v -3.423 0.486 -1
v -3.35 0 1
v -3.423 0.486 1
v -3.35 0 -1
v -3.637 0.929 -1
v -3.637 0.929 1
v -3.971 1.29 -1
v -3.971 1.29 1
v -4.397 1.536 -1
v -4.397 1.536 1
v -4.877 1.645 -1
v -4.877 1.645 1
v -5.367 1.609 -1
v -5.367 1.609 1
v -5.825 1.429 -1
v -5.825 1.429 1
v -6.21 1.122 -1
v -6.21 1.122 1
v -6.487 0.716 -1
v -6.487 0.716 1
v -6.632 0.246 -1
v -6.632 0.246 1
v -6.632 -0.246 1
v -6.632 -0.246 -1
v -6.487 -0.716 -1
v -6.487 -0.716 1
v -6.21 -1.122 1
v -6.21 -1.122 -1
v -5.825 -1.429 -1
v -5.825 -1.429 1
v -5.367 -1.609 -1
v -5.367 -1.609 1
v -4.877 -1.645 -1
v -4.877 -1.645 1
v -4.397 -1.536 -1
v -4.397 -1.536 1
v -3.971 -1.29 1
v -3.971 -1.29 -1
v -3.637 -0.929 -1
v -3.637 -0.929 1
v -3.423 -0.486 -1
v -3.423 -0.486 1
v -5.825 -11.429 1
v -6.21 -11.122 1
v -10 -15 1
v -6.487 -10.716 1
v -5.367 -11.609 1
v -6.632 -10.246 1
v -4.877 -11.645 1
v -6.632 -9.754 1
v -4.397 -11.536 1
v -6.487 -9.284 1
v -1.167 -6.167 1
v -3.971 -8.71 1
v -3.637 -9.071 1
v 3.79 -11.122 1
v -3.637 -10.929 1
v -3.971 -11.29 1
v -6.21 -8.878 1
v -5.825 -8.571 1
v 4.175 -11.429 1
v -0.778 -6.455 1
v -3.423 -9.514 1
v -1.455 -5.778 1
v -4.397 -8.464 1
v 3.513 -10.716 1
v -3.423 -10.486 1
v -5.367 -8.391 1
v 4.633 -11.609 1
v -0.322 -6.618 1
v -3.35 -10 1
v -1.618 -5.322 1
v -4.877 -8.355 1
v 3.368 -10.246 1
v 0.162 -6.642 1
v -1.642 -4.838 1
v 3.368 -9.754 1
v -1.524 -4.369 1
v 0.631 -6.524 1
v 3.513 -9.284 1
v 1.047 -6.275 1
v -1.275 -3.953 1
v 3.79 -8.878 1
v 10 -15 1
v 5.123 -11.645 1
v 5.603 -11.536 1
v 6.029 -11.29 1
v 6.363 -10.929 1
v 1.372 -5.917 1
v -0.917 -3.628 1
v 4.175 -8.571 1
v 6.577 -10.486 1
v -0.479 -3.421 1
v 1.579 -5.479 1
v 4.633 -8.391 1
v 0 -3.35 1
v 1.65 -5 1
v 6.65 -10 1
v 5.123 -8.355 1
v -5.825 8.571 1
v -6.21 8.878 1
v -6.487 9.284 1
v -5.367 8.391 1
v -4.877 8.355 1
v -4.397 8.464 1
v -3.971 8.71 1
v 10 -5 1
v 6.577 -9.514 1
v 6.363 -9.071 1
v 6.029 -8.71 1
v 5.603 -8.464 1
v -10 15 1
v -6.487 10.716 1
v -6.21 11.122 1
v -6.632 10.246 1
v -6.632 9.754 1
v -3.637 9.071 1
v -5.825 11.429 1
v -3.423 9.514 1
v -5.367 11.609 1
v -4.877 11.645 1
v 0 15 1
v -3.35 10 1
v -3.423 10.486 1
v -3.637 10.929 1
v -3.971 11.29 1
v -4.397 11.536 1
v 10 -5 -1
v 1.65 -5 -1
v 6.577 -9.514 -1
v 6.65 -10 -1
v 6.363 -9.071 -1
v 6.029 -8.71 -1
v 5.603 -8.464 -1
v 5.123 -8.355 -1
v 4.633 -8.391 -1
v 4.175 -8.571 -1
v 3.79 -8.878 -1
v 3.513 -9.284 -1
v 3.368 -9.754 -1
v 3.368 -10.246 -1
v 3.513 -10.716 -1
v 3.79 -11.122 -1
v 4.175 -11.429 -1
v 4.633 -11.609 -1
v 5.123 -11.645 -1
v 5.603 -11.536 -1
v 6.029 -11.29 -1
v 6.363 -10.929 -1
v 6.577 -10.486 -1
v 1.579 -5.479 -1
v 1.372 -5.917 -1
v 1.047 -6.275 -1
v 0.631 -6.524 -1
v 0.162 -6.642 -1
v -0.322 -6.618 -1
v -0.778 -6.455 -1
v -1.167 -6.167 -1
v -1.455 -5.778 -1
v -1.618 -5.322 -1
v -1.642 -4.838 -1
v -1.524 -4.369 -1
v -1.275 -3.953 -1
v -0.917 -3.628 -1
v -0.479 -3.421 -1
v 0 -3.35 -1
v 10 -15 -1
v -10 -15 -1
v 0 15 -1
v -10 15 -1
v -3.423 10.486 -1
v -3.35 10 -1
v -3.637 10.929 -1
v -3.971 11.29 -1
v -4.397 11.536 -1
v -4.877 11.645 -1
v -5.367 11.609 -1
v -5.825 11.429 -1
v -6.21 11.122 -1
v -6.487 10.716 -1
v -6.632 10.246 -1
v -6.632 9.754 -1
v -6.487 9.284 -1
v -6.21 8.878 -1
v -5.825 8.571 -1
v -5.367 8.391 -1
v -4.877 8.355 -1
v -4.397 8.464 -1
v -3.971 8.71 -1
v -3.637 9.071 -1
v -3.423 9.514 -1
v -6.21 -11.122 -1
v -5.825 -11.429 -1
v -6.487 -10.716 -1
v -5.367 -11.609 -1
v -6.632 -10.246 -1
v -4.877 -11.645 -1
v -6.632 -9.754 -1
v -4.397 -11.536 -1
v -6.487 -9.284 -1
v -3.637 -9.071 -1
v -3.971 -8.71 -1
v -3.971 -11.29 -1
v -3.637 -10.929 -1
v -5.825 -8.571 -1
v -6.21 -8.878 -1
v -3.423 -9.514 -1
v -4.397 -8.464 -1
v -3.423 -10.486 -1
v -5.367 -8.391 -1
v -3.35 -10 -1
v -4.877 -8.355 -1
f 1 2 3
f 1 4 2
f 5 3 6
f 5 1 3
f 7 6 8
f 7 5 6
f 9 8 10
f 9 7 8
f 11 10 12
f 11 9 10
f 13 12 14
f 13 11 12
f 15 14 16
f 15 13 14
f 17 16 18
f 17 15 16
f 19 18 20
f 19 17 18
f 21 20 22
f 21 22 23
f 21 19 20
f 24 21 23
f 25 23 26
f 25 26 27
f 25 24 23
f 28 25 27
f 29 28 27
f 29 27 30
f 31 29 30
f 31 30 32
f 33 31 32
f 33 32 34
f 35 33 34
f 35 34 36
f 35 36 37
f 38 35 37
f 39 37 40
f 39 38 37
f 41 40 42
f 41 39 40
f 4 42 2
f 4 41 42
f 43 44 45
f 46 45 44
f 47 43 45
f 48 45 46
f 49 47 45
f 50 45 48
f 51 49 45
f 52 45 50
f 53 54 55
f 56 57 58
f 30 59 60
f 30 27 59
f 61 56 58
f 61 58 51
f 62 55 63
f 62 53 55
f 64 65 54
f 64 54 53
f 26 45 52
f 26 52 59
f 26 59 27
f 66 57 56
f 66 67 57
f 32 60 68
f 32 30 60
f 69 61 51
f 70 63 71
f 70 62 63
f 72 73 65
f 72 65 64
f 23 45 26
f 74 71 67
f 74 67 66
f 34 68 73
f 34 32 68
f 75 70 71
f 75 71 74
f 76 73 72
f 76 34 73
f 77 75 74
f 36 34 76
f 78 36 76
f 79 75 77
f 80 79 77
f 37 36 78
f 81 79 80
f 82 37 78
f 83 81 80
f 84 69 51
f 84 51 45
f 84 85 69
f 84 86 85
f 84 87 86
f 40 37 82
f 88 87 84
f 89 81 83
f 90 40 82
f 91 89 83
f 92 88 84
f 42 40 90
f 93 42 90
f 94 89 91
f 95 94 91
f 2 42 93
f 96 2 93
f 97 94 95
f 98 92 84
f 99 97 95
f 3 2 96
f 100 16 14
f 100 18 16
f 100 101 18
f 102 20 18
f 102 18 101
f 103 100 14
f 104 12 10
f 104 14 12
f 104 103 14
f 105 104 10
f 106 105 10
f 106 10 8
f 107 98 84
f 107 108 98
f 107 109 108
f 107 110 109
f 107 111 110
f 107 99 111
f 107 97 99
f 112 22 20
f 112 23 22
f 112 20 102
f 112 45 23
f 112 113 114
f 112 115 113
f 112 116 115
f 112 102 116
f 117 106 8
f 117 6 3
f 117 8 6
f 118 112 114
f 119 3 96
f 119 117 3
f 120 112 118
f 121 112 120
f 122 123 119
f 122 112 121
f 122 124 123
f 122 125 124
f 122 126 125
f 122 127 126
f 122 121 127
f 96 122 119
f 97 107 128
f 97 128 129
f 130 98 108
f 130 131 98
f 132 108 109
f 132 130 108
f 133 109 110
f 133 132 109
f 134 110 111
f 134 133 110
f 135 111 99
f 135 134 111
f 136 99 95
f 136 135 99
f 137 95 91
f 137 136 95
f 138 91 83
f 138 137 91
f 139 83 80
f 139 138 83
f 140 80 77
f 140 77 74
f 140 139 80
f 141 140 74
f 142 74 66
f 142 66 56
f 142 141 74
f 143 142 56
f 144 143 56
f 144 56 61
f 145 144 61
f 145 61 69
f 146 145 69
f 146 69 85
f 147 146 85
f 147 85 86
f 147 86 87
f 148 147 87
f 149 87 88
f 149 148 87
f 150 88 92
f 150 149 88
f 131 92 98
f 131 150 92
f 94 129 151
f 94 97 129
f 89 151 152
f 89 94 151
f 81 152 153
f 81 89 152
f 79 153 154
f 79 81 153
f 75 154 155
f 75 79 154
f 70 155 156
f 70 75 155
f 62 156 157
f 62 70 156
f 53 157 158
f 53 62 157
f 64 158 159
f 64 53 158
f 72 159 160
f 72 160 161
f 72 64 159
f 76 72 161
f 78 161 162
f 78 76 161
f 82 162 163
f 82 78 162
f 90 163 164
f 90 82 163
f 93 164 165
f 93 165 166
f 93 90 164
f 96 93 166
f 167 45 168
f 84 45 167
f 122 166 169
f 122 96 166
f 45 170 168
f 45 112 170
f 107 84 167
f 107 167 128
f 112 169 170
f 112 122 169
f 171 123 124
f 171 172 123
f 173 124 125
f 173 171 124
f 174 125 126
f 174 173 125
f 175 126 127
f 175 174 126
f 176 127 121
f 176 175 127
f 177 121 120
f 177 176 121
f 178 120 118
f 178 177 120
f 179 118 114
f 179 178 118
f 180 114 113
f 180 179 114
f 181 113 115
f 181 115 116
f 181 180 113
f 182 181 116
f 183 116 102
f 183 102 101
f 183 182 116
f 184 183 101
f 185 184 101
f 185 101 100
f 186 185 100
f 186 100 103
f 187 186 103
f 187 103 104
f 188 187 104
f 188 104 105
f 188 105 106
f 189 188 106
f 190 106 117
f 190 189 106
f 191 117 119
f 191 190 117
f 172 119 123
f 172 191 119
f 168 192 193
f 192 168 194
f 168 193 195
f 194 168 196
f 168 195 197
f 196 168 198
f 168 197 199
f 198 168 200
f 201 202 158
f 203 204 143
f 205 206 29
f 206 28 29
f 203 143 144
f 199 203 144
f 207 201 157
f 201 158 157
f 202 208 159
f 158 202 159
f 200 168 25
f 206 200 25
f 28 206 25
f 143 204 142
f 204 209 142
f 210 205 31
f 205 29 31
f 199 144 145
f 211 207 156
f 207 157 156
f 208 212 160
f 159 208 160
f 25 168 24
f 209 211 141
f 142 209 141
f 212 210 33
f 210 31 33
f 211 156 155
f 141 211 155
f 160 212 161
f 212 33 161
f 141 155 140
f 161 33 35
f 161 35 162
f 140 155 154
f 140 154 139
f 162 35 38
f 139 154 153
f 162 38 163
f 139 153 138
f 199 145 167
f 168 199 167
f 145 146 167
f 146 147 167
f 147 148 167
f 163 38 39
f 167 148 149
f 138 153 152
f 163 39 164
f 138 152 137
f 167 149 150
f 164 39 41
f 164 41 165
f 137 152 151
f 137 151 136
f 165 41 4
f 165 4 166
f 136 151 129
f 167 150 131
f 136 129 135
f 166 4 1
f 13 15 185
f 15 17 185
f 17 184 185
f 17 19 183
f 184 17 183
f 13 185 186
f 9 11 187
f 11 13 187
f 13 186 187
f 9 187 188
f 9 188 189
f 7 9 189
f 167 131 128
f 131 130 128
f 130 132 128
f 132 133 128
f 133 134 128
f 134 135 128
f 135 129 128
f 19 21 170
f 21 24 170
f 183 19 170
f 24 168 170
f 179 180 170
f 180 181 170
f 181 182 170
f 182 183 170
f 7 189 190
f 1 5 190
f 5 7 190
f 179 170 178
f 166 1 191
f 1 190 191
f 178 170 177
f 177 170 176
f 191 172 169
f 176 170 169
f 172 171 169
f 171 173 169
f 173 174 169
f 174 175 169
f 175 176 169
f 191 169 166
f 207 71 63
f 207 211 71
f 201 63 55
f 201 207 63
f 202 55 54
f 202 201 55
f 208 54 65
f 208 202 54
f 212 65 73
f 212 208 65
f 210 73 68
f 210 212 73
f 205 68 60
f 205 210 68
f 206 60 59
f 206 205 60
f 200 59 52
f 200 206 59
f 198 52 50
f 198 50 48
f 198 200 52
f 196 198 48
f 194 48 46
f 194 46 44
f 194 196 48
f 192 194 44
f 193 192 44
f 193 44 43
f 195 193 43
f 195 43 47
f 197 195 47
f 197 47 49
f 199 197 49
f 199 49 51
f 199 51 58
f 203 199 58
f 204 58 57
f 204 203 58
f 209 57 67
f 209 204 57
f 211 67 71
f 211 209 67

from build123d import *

# Parameters (mm, degrees)
SKETCH1_R           = 1.65
BOSS_EXTRUDE1_DEPTH = 1


with BuildPart() as part:
    # Sketch1 → Boss-Extrude1 (new body, symmetric)
    with BuildSketch(Plane.XY):
        with BuildLine():
            Line((-10, 15), (-10, -15))
            Line((-10, -15), (10, -15))
            Line((10, -15), (10, -5))
            Line((10, -5), (1.65, -5))
            ThreePointArc((1.65, -5), (-1.166726189, -6.166726189), (0, -3.35))
            Line((0, -3.35), (0, 15))
            Line((0, 15), (-10, 15))
        make_face()
        with Locations((-5, 10)):
            Circle(SKETCH1_R, mode=Mode.SUBTRACT)
        with Locations((-5, 0)):
            Circle(SKETCH1_R, mode=Mode.SUBTRACT)
        with Locations((5, -10)):
            Circle(SKETCH1_R, mode=Mode.SUBTRACT)
        with Locations((-5, -10)):
            Circle(SKETCH1_R, mode=Mode.SUBTRACT)
    extrude(amount=BOSS_EXTRUDE1_DEPTH, both=True)


solid = part.part
